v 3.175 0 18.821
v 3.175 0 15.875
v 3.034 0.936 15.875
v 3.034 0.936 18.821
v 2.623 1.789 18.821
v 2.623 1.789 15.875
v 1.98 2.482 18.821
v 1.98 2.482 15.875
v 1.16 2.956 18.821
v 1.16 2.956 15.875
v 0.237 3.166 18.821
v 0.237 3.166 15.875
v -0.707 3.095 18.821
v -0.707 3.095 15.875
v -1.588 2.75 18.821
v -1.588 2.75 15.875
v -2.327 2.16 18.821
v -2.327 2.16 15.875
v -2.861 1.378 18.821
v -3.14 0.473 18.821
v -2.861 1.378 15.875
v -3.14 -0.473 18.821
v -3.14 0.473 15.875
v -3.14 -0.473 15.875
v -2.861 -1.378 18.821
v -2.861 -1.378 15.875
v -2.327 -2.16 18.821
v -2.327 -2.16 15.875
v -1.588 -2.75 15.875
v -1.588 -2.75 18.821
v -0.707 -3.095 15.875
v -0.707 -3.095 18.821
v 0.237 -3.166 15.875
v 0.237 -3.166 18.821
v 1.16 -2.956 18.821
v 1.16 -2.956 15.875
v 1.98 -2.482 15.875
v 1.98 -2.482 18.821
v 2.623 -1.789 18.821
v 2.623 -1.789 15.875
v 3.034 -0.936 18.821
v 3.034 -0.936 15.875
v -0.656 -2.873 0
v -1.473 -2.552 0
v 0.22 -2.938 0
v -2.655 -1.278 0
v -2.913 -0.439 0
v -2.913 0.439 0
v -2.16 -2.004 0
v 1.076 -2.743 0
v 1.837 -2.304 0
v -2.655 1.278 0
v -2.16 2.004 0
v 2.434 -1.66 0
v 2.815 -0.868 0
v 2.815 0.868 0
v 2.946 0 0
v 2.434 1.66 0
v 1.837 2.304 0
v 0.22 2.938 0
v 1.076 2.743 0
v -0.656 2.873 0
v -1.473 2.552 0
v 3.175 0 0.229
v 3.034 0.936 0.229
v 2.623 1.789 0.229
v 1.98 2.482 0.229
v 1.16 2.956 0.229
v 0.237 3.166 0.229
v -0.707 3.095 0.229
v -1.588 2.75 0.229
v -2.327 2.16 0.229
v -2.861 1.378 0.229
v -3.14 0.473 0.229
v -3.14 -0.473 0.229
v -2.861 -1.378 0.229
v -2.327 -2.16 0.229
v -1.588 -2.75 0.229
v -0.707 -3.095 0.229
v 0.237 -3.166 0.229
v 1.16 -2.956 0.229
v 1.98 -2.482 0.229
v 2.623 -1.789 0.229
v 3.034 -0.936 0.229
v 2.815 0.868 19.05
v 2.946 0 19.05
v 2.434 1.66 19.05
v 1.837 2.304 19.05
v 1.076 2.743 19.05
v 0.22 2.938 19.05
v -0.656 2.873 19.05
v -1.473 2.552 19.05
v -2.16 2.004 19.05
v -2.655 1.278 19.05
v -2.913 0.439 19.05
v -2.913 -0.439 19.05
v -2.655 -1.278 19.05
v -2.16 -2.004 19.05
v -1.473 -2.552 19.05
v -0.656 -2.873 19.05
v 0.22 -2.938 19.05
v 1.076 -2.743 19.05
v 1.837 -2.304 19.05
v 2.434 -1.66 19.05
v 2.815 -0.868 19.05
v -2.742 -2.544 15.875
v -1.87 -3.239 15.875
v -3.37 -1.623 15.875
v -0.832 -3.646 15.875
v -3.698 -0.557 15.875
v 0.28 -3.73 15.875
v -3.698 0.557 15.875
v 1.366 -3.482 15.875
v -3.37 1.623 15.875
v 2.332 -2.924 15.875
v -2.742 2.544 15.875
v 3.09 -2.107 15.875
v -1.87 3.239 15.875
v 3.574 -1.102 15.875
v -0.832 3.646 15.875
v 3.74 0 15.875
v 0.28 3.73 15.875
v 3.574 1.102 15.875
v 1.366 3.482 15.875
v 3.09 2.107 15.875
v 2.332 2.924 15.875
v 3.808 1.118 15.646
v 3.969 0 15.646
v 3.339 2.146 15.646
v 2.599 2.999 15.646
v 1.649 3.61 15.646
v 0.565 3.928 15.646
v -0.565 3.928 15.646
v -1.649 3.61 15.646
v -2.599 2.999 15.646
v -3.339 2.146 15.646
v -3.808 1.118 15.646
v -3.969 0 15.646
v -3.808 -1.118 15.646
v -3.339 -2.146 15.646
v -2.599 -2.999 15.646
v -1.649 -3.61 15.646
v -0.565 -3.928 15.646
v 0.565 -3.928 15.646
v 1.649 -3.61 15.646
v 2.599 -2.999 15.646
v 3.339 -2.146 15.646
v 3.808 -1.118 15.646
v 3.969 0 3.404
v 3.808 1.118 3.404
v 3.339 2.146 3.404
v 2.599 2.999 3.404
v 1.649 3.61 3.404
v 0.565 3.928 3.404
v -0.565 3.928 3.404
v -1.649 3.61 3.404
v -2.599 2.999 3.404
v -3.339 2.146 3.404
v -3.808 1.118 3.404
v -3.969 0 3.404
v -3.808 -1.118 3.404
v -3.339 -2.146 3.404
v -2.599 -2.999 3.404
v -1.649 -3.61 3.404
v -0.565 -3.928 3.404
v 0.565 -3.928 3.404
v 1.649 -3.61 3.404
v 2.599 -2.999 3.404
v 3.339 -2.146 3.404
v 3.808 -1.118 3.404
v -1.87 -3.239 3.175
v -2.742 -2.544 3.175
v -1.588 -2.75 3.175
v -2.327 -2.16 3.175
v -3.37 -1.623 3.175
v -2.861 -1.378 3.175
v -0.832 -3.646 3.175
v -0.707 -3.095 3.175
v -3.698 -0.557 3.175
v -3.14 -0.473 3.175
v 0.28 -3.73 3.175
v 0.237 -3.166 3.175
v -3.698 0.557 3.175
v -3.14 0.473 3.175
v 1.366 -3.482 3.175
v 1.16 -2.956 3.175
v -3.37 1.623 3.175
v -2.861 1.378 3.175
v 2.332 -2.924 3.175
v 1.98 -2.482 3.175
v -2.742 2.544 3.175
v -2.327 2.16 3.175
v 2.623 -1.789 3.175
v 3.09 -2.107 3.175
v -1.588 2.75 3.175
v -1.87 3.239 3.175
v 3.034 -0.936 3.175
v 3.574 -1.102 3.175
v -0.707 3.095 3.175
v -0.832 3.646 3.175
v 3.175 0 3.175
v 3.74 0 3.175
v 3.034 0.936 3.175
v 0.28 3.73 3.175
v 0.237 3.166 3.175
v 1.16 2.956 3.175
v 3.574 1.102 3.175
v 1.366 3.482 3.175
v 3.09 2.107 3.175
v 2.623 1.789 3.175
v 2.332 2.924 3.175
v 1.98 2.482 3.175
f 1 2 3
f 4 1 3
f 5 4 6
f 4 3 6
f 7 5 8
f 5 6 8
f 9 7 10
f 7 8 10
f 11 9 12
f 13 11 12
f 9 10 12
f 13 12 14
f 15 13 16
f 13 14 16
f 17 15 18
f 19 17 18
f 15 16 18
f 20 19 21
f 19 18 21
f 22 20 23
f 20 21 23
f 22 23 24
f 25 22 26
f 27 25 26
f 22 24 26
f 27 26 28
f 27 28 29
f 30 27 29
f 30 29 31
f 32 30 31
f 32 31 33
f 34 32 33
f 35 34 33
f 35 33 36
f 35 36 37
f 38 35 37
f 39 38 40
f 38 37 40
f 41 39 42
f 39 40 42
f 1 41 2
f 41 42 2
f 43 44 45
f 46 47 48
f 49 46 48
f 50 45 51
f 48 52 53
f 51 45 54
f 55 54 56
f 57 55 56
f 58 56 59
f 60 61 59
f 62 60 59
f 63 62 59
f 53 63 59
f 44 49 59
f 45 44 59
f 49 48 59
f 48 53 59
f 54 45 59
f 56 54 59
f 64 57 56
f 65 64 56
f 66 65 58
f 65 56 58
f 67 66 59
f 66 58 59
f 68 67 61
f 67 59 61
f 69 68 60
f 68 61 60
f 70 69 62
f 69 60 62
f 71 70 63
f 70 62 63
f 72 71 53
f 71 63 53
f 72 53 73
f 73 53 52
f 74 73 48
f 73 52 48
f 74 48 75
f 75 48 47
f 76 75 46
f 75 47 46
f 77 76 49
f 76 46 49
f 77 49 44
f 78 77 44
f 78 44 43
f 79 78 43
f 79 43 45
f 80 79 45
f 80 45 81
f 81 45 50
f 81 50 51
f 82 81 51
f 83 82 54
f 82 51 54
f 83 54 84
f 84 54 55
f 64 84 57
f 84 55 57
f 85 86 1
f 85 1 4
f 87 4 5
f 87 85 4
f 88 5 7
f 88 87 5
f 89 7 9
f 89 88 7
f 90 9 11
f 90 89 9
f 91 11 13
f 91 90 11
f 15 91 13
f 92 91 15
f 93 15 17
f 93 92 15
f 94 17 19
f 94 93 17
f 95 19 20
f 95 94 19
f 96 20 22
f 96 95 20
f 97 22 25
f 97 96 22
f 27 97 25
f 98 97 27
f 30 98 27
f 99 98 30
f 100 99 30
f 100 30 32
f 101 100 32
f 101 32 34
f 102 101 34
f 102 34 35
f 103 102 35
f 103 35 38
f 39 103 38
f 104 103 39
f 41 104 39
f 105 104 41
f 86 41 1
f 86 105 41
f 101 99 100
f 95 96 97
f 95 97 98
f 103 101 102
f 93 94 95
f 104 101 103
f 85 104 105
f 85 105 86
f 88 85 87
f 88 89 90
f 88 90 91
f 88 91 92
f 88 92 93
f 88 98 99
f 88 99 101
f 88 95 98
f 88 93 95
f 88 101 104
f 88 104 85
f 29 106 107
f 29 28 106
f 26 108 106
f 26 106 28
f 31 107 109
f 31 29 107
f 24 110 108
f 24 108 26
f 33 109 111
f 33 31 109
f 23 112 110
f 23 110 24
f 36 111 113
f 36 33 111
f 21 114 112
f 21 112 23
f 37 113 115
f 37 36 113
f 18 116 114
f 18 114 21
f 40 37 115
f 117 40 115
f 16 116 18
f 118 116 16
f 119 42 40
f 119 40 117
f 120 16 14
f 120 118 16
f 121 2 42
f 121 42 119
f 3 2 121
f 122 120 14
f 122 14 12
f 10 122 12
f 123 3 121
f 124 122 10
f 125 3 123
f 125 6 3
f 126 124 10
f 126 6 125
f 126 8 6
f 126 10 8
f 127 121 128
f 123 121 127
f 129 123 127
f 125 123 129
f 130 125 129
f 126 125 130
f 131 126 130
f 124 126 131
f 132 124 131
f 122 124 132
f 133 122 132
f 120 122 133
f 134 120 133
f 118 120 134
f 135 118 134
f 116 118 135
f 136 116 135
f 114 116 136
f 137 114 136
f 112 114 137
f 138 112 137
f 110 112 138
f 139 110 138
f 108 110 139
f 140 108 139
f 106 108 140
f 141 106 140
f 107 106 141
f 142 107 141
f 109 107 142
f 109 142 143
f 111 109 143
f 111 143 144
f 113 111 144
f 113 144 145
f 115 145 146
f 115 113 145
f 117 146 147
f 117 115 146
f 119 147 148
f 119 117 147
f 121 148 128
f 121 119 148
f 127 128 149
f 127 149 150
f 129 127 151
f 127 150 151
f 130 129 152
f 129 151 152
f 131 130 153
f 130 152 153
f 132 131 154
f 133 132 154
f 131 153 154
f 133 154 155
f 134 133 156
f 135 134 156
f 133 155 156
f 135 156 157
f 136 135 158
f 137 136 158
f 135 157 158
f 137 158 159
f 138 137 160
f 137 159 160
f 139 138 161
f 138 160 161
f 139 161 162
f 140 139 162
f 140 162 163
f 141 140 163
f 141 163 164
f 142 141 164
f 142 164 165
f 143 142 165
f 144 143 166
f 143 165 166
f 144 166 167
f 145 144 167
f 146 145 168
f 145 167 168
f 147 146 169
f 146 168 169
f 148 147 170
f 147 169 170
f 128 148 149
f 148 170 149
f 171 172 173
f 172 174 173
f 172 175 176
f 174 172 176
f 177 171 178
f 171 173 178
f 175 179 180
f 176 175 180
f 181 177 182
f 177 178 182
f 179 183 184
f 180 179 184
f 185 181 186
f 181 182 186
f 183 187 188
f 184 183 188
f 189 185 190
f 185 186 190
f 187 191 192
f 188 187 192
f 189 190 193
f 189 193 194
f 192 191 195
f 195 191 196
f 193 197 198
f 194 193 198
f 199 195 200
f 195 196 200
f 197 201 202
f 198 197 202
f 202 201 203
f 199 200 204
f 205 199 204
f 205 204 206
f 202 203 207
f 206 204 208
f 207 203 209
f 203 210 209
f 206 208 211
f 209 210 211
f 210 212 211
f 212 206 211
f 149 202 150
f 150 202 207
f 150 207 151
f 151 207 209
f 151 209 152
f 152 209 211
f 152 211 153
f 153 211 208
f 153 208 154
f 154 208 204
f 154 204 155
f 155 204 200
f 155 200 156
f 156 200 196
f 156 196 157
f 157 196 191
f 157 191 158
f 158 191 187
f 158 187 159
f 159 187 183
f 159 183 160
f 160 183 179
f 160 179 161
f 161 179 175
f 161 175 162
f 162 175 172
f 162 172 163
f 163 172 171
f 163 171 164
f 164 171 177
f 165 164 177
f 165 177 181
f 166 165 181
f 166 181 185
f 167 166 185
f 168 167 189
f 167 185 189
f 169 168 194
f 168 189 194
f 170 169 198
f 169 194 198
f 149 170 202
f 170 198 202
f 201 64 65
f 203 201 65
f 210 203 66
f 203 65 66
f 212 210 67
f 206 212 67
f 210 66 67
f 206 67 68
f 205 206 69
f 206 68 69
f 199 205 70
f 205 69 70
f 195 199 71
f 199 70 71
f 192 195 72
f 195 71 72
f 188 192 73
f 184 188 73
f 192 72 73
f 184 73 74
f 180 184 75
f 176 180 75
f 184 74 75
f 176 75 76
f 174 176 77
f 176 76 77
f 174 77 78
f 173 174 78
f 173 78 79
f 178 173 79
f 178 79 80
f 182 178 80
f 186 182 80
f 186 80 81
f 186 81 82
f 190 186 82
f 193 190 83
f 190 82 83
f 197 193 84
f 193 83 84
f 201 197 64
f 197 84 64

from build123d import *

# Parameters (mm, degrees)
F0_R     = 3.175
F1_DEPTH = 3.175
F2_R     = 3.96875
F3_DEPTH = 12.7
F4_R     = 3.175
F5_DEPTH = 3.175
F6_SIZE  = 0.2286


with BuildPart() as f1:
    # F0 (on Top) → F1 (new body)
    with BuildSketch(Plane.XY):
        Circle(F0_R)
    extrude(amount=F1_DEPTH)

    # F2 (on face) → F3 (join)
    with BuildSketch(Plane.XY.offset(3.175)):
        Circle(F2_R)
    extrude(amount=F3_DEPTH)

    # F4 (on face) → F5 (join)
    with BuildSketch(Plane.XY.offset(15.875)):
        Circle(F4_R)
    extrude(amount=F5_DEPTH)

    # F6
    f6_edges = [f1.edges().sort_by_distance(p)[0] for p in [
        (-3.175, 0, 19.05),
        (-3.96875, 0, 15.875),
        (-3.96875, 0, 3.175),
        (-3.175, 0, 0),
    ]]
    chamfer(f6_edges, length=F6_SIZE)


solid = f1.part
